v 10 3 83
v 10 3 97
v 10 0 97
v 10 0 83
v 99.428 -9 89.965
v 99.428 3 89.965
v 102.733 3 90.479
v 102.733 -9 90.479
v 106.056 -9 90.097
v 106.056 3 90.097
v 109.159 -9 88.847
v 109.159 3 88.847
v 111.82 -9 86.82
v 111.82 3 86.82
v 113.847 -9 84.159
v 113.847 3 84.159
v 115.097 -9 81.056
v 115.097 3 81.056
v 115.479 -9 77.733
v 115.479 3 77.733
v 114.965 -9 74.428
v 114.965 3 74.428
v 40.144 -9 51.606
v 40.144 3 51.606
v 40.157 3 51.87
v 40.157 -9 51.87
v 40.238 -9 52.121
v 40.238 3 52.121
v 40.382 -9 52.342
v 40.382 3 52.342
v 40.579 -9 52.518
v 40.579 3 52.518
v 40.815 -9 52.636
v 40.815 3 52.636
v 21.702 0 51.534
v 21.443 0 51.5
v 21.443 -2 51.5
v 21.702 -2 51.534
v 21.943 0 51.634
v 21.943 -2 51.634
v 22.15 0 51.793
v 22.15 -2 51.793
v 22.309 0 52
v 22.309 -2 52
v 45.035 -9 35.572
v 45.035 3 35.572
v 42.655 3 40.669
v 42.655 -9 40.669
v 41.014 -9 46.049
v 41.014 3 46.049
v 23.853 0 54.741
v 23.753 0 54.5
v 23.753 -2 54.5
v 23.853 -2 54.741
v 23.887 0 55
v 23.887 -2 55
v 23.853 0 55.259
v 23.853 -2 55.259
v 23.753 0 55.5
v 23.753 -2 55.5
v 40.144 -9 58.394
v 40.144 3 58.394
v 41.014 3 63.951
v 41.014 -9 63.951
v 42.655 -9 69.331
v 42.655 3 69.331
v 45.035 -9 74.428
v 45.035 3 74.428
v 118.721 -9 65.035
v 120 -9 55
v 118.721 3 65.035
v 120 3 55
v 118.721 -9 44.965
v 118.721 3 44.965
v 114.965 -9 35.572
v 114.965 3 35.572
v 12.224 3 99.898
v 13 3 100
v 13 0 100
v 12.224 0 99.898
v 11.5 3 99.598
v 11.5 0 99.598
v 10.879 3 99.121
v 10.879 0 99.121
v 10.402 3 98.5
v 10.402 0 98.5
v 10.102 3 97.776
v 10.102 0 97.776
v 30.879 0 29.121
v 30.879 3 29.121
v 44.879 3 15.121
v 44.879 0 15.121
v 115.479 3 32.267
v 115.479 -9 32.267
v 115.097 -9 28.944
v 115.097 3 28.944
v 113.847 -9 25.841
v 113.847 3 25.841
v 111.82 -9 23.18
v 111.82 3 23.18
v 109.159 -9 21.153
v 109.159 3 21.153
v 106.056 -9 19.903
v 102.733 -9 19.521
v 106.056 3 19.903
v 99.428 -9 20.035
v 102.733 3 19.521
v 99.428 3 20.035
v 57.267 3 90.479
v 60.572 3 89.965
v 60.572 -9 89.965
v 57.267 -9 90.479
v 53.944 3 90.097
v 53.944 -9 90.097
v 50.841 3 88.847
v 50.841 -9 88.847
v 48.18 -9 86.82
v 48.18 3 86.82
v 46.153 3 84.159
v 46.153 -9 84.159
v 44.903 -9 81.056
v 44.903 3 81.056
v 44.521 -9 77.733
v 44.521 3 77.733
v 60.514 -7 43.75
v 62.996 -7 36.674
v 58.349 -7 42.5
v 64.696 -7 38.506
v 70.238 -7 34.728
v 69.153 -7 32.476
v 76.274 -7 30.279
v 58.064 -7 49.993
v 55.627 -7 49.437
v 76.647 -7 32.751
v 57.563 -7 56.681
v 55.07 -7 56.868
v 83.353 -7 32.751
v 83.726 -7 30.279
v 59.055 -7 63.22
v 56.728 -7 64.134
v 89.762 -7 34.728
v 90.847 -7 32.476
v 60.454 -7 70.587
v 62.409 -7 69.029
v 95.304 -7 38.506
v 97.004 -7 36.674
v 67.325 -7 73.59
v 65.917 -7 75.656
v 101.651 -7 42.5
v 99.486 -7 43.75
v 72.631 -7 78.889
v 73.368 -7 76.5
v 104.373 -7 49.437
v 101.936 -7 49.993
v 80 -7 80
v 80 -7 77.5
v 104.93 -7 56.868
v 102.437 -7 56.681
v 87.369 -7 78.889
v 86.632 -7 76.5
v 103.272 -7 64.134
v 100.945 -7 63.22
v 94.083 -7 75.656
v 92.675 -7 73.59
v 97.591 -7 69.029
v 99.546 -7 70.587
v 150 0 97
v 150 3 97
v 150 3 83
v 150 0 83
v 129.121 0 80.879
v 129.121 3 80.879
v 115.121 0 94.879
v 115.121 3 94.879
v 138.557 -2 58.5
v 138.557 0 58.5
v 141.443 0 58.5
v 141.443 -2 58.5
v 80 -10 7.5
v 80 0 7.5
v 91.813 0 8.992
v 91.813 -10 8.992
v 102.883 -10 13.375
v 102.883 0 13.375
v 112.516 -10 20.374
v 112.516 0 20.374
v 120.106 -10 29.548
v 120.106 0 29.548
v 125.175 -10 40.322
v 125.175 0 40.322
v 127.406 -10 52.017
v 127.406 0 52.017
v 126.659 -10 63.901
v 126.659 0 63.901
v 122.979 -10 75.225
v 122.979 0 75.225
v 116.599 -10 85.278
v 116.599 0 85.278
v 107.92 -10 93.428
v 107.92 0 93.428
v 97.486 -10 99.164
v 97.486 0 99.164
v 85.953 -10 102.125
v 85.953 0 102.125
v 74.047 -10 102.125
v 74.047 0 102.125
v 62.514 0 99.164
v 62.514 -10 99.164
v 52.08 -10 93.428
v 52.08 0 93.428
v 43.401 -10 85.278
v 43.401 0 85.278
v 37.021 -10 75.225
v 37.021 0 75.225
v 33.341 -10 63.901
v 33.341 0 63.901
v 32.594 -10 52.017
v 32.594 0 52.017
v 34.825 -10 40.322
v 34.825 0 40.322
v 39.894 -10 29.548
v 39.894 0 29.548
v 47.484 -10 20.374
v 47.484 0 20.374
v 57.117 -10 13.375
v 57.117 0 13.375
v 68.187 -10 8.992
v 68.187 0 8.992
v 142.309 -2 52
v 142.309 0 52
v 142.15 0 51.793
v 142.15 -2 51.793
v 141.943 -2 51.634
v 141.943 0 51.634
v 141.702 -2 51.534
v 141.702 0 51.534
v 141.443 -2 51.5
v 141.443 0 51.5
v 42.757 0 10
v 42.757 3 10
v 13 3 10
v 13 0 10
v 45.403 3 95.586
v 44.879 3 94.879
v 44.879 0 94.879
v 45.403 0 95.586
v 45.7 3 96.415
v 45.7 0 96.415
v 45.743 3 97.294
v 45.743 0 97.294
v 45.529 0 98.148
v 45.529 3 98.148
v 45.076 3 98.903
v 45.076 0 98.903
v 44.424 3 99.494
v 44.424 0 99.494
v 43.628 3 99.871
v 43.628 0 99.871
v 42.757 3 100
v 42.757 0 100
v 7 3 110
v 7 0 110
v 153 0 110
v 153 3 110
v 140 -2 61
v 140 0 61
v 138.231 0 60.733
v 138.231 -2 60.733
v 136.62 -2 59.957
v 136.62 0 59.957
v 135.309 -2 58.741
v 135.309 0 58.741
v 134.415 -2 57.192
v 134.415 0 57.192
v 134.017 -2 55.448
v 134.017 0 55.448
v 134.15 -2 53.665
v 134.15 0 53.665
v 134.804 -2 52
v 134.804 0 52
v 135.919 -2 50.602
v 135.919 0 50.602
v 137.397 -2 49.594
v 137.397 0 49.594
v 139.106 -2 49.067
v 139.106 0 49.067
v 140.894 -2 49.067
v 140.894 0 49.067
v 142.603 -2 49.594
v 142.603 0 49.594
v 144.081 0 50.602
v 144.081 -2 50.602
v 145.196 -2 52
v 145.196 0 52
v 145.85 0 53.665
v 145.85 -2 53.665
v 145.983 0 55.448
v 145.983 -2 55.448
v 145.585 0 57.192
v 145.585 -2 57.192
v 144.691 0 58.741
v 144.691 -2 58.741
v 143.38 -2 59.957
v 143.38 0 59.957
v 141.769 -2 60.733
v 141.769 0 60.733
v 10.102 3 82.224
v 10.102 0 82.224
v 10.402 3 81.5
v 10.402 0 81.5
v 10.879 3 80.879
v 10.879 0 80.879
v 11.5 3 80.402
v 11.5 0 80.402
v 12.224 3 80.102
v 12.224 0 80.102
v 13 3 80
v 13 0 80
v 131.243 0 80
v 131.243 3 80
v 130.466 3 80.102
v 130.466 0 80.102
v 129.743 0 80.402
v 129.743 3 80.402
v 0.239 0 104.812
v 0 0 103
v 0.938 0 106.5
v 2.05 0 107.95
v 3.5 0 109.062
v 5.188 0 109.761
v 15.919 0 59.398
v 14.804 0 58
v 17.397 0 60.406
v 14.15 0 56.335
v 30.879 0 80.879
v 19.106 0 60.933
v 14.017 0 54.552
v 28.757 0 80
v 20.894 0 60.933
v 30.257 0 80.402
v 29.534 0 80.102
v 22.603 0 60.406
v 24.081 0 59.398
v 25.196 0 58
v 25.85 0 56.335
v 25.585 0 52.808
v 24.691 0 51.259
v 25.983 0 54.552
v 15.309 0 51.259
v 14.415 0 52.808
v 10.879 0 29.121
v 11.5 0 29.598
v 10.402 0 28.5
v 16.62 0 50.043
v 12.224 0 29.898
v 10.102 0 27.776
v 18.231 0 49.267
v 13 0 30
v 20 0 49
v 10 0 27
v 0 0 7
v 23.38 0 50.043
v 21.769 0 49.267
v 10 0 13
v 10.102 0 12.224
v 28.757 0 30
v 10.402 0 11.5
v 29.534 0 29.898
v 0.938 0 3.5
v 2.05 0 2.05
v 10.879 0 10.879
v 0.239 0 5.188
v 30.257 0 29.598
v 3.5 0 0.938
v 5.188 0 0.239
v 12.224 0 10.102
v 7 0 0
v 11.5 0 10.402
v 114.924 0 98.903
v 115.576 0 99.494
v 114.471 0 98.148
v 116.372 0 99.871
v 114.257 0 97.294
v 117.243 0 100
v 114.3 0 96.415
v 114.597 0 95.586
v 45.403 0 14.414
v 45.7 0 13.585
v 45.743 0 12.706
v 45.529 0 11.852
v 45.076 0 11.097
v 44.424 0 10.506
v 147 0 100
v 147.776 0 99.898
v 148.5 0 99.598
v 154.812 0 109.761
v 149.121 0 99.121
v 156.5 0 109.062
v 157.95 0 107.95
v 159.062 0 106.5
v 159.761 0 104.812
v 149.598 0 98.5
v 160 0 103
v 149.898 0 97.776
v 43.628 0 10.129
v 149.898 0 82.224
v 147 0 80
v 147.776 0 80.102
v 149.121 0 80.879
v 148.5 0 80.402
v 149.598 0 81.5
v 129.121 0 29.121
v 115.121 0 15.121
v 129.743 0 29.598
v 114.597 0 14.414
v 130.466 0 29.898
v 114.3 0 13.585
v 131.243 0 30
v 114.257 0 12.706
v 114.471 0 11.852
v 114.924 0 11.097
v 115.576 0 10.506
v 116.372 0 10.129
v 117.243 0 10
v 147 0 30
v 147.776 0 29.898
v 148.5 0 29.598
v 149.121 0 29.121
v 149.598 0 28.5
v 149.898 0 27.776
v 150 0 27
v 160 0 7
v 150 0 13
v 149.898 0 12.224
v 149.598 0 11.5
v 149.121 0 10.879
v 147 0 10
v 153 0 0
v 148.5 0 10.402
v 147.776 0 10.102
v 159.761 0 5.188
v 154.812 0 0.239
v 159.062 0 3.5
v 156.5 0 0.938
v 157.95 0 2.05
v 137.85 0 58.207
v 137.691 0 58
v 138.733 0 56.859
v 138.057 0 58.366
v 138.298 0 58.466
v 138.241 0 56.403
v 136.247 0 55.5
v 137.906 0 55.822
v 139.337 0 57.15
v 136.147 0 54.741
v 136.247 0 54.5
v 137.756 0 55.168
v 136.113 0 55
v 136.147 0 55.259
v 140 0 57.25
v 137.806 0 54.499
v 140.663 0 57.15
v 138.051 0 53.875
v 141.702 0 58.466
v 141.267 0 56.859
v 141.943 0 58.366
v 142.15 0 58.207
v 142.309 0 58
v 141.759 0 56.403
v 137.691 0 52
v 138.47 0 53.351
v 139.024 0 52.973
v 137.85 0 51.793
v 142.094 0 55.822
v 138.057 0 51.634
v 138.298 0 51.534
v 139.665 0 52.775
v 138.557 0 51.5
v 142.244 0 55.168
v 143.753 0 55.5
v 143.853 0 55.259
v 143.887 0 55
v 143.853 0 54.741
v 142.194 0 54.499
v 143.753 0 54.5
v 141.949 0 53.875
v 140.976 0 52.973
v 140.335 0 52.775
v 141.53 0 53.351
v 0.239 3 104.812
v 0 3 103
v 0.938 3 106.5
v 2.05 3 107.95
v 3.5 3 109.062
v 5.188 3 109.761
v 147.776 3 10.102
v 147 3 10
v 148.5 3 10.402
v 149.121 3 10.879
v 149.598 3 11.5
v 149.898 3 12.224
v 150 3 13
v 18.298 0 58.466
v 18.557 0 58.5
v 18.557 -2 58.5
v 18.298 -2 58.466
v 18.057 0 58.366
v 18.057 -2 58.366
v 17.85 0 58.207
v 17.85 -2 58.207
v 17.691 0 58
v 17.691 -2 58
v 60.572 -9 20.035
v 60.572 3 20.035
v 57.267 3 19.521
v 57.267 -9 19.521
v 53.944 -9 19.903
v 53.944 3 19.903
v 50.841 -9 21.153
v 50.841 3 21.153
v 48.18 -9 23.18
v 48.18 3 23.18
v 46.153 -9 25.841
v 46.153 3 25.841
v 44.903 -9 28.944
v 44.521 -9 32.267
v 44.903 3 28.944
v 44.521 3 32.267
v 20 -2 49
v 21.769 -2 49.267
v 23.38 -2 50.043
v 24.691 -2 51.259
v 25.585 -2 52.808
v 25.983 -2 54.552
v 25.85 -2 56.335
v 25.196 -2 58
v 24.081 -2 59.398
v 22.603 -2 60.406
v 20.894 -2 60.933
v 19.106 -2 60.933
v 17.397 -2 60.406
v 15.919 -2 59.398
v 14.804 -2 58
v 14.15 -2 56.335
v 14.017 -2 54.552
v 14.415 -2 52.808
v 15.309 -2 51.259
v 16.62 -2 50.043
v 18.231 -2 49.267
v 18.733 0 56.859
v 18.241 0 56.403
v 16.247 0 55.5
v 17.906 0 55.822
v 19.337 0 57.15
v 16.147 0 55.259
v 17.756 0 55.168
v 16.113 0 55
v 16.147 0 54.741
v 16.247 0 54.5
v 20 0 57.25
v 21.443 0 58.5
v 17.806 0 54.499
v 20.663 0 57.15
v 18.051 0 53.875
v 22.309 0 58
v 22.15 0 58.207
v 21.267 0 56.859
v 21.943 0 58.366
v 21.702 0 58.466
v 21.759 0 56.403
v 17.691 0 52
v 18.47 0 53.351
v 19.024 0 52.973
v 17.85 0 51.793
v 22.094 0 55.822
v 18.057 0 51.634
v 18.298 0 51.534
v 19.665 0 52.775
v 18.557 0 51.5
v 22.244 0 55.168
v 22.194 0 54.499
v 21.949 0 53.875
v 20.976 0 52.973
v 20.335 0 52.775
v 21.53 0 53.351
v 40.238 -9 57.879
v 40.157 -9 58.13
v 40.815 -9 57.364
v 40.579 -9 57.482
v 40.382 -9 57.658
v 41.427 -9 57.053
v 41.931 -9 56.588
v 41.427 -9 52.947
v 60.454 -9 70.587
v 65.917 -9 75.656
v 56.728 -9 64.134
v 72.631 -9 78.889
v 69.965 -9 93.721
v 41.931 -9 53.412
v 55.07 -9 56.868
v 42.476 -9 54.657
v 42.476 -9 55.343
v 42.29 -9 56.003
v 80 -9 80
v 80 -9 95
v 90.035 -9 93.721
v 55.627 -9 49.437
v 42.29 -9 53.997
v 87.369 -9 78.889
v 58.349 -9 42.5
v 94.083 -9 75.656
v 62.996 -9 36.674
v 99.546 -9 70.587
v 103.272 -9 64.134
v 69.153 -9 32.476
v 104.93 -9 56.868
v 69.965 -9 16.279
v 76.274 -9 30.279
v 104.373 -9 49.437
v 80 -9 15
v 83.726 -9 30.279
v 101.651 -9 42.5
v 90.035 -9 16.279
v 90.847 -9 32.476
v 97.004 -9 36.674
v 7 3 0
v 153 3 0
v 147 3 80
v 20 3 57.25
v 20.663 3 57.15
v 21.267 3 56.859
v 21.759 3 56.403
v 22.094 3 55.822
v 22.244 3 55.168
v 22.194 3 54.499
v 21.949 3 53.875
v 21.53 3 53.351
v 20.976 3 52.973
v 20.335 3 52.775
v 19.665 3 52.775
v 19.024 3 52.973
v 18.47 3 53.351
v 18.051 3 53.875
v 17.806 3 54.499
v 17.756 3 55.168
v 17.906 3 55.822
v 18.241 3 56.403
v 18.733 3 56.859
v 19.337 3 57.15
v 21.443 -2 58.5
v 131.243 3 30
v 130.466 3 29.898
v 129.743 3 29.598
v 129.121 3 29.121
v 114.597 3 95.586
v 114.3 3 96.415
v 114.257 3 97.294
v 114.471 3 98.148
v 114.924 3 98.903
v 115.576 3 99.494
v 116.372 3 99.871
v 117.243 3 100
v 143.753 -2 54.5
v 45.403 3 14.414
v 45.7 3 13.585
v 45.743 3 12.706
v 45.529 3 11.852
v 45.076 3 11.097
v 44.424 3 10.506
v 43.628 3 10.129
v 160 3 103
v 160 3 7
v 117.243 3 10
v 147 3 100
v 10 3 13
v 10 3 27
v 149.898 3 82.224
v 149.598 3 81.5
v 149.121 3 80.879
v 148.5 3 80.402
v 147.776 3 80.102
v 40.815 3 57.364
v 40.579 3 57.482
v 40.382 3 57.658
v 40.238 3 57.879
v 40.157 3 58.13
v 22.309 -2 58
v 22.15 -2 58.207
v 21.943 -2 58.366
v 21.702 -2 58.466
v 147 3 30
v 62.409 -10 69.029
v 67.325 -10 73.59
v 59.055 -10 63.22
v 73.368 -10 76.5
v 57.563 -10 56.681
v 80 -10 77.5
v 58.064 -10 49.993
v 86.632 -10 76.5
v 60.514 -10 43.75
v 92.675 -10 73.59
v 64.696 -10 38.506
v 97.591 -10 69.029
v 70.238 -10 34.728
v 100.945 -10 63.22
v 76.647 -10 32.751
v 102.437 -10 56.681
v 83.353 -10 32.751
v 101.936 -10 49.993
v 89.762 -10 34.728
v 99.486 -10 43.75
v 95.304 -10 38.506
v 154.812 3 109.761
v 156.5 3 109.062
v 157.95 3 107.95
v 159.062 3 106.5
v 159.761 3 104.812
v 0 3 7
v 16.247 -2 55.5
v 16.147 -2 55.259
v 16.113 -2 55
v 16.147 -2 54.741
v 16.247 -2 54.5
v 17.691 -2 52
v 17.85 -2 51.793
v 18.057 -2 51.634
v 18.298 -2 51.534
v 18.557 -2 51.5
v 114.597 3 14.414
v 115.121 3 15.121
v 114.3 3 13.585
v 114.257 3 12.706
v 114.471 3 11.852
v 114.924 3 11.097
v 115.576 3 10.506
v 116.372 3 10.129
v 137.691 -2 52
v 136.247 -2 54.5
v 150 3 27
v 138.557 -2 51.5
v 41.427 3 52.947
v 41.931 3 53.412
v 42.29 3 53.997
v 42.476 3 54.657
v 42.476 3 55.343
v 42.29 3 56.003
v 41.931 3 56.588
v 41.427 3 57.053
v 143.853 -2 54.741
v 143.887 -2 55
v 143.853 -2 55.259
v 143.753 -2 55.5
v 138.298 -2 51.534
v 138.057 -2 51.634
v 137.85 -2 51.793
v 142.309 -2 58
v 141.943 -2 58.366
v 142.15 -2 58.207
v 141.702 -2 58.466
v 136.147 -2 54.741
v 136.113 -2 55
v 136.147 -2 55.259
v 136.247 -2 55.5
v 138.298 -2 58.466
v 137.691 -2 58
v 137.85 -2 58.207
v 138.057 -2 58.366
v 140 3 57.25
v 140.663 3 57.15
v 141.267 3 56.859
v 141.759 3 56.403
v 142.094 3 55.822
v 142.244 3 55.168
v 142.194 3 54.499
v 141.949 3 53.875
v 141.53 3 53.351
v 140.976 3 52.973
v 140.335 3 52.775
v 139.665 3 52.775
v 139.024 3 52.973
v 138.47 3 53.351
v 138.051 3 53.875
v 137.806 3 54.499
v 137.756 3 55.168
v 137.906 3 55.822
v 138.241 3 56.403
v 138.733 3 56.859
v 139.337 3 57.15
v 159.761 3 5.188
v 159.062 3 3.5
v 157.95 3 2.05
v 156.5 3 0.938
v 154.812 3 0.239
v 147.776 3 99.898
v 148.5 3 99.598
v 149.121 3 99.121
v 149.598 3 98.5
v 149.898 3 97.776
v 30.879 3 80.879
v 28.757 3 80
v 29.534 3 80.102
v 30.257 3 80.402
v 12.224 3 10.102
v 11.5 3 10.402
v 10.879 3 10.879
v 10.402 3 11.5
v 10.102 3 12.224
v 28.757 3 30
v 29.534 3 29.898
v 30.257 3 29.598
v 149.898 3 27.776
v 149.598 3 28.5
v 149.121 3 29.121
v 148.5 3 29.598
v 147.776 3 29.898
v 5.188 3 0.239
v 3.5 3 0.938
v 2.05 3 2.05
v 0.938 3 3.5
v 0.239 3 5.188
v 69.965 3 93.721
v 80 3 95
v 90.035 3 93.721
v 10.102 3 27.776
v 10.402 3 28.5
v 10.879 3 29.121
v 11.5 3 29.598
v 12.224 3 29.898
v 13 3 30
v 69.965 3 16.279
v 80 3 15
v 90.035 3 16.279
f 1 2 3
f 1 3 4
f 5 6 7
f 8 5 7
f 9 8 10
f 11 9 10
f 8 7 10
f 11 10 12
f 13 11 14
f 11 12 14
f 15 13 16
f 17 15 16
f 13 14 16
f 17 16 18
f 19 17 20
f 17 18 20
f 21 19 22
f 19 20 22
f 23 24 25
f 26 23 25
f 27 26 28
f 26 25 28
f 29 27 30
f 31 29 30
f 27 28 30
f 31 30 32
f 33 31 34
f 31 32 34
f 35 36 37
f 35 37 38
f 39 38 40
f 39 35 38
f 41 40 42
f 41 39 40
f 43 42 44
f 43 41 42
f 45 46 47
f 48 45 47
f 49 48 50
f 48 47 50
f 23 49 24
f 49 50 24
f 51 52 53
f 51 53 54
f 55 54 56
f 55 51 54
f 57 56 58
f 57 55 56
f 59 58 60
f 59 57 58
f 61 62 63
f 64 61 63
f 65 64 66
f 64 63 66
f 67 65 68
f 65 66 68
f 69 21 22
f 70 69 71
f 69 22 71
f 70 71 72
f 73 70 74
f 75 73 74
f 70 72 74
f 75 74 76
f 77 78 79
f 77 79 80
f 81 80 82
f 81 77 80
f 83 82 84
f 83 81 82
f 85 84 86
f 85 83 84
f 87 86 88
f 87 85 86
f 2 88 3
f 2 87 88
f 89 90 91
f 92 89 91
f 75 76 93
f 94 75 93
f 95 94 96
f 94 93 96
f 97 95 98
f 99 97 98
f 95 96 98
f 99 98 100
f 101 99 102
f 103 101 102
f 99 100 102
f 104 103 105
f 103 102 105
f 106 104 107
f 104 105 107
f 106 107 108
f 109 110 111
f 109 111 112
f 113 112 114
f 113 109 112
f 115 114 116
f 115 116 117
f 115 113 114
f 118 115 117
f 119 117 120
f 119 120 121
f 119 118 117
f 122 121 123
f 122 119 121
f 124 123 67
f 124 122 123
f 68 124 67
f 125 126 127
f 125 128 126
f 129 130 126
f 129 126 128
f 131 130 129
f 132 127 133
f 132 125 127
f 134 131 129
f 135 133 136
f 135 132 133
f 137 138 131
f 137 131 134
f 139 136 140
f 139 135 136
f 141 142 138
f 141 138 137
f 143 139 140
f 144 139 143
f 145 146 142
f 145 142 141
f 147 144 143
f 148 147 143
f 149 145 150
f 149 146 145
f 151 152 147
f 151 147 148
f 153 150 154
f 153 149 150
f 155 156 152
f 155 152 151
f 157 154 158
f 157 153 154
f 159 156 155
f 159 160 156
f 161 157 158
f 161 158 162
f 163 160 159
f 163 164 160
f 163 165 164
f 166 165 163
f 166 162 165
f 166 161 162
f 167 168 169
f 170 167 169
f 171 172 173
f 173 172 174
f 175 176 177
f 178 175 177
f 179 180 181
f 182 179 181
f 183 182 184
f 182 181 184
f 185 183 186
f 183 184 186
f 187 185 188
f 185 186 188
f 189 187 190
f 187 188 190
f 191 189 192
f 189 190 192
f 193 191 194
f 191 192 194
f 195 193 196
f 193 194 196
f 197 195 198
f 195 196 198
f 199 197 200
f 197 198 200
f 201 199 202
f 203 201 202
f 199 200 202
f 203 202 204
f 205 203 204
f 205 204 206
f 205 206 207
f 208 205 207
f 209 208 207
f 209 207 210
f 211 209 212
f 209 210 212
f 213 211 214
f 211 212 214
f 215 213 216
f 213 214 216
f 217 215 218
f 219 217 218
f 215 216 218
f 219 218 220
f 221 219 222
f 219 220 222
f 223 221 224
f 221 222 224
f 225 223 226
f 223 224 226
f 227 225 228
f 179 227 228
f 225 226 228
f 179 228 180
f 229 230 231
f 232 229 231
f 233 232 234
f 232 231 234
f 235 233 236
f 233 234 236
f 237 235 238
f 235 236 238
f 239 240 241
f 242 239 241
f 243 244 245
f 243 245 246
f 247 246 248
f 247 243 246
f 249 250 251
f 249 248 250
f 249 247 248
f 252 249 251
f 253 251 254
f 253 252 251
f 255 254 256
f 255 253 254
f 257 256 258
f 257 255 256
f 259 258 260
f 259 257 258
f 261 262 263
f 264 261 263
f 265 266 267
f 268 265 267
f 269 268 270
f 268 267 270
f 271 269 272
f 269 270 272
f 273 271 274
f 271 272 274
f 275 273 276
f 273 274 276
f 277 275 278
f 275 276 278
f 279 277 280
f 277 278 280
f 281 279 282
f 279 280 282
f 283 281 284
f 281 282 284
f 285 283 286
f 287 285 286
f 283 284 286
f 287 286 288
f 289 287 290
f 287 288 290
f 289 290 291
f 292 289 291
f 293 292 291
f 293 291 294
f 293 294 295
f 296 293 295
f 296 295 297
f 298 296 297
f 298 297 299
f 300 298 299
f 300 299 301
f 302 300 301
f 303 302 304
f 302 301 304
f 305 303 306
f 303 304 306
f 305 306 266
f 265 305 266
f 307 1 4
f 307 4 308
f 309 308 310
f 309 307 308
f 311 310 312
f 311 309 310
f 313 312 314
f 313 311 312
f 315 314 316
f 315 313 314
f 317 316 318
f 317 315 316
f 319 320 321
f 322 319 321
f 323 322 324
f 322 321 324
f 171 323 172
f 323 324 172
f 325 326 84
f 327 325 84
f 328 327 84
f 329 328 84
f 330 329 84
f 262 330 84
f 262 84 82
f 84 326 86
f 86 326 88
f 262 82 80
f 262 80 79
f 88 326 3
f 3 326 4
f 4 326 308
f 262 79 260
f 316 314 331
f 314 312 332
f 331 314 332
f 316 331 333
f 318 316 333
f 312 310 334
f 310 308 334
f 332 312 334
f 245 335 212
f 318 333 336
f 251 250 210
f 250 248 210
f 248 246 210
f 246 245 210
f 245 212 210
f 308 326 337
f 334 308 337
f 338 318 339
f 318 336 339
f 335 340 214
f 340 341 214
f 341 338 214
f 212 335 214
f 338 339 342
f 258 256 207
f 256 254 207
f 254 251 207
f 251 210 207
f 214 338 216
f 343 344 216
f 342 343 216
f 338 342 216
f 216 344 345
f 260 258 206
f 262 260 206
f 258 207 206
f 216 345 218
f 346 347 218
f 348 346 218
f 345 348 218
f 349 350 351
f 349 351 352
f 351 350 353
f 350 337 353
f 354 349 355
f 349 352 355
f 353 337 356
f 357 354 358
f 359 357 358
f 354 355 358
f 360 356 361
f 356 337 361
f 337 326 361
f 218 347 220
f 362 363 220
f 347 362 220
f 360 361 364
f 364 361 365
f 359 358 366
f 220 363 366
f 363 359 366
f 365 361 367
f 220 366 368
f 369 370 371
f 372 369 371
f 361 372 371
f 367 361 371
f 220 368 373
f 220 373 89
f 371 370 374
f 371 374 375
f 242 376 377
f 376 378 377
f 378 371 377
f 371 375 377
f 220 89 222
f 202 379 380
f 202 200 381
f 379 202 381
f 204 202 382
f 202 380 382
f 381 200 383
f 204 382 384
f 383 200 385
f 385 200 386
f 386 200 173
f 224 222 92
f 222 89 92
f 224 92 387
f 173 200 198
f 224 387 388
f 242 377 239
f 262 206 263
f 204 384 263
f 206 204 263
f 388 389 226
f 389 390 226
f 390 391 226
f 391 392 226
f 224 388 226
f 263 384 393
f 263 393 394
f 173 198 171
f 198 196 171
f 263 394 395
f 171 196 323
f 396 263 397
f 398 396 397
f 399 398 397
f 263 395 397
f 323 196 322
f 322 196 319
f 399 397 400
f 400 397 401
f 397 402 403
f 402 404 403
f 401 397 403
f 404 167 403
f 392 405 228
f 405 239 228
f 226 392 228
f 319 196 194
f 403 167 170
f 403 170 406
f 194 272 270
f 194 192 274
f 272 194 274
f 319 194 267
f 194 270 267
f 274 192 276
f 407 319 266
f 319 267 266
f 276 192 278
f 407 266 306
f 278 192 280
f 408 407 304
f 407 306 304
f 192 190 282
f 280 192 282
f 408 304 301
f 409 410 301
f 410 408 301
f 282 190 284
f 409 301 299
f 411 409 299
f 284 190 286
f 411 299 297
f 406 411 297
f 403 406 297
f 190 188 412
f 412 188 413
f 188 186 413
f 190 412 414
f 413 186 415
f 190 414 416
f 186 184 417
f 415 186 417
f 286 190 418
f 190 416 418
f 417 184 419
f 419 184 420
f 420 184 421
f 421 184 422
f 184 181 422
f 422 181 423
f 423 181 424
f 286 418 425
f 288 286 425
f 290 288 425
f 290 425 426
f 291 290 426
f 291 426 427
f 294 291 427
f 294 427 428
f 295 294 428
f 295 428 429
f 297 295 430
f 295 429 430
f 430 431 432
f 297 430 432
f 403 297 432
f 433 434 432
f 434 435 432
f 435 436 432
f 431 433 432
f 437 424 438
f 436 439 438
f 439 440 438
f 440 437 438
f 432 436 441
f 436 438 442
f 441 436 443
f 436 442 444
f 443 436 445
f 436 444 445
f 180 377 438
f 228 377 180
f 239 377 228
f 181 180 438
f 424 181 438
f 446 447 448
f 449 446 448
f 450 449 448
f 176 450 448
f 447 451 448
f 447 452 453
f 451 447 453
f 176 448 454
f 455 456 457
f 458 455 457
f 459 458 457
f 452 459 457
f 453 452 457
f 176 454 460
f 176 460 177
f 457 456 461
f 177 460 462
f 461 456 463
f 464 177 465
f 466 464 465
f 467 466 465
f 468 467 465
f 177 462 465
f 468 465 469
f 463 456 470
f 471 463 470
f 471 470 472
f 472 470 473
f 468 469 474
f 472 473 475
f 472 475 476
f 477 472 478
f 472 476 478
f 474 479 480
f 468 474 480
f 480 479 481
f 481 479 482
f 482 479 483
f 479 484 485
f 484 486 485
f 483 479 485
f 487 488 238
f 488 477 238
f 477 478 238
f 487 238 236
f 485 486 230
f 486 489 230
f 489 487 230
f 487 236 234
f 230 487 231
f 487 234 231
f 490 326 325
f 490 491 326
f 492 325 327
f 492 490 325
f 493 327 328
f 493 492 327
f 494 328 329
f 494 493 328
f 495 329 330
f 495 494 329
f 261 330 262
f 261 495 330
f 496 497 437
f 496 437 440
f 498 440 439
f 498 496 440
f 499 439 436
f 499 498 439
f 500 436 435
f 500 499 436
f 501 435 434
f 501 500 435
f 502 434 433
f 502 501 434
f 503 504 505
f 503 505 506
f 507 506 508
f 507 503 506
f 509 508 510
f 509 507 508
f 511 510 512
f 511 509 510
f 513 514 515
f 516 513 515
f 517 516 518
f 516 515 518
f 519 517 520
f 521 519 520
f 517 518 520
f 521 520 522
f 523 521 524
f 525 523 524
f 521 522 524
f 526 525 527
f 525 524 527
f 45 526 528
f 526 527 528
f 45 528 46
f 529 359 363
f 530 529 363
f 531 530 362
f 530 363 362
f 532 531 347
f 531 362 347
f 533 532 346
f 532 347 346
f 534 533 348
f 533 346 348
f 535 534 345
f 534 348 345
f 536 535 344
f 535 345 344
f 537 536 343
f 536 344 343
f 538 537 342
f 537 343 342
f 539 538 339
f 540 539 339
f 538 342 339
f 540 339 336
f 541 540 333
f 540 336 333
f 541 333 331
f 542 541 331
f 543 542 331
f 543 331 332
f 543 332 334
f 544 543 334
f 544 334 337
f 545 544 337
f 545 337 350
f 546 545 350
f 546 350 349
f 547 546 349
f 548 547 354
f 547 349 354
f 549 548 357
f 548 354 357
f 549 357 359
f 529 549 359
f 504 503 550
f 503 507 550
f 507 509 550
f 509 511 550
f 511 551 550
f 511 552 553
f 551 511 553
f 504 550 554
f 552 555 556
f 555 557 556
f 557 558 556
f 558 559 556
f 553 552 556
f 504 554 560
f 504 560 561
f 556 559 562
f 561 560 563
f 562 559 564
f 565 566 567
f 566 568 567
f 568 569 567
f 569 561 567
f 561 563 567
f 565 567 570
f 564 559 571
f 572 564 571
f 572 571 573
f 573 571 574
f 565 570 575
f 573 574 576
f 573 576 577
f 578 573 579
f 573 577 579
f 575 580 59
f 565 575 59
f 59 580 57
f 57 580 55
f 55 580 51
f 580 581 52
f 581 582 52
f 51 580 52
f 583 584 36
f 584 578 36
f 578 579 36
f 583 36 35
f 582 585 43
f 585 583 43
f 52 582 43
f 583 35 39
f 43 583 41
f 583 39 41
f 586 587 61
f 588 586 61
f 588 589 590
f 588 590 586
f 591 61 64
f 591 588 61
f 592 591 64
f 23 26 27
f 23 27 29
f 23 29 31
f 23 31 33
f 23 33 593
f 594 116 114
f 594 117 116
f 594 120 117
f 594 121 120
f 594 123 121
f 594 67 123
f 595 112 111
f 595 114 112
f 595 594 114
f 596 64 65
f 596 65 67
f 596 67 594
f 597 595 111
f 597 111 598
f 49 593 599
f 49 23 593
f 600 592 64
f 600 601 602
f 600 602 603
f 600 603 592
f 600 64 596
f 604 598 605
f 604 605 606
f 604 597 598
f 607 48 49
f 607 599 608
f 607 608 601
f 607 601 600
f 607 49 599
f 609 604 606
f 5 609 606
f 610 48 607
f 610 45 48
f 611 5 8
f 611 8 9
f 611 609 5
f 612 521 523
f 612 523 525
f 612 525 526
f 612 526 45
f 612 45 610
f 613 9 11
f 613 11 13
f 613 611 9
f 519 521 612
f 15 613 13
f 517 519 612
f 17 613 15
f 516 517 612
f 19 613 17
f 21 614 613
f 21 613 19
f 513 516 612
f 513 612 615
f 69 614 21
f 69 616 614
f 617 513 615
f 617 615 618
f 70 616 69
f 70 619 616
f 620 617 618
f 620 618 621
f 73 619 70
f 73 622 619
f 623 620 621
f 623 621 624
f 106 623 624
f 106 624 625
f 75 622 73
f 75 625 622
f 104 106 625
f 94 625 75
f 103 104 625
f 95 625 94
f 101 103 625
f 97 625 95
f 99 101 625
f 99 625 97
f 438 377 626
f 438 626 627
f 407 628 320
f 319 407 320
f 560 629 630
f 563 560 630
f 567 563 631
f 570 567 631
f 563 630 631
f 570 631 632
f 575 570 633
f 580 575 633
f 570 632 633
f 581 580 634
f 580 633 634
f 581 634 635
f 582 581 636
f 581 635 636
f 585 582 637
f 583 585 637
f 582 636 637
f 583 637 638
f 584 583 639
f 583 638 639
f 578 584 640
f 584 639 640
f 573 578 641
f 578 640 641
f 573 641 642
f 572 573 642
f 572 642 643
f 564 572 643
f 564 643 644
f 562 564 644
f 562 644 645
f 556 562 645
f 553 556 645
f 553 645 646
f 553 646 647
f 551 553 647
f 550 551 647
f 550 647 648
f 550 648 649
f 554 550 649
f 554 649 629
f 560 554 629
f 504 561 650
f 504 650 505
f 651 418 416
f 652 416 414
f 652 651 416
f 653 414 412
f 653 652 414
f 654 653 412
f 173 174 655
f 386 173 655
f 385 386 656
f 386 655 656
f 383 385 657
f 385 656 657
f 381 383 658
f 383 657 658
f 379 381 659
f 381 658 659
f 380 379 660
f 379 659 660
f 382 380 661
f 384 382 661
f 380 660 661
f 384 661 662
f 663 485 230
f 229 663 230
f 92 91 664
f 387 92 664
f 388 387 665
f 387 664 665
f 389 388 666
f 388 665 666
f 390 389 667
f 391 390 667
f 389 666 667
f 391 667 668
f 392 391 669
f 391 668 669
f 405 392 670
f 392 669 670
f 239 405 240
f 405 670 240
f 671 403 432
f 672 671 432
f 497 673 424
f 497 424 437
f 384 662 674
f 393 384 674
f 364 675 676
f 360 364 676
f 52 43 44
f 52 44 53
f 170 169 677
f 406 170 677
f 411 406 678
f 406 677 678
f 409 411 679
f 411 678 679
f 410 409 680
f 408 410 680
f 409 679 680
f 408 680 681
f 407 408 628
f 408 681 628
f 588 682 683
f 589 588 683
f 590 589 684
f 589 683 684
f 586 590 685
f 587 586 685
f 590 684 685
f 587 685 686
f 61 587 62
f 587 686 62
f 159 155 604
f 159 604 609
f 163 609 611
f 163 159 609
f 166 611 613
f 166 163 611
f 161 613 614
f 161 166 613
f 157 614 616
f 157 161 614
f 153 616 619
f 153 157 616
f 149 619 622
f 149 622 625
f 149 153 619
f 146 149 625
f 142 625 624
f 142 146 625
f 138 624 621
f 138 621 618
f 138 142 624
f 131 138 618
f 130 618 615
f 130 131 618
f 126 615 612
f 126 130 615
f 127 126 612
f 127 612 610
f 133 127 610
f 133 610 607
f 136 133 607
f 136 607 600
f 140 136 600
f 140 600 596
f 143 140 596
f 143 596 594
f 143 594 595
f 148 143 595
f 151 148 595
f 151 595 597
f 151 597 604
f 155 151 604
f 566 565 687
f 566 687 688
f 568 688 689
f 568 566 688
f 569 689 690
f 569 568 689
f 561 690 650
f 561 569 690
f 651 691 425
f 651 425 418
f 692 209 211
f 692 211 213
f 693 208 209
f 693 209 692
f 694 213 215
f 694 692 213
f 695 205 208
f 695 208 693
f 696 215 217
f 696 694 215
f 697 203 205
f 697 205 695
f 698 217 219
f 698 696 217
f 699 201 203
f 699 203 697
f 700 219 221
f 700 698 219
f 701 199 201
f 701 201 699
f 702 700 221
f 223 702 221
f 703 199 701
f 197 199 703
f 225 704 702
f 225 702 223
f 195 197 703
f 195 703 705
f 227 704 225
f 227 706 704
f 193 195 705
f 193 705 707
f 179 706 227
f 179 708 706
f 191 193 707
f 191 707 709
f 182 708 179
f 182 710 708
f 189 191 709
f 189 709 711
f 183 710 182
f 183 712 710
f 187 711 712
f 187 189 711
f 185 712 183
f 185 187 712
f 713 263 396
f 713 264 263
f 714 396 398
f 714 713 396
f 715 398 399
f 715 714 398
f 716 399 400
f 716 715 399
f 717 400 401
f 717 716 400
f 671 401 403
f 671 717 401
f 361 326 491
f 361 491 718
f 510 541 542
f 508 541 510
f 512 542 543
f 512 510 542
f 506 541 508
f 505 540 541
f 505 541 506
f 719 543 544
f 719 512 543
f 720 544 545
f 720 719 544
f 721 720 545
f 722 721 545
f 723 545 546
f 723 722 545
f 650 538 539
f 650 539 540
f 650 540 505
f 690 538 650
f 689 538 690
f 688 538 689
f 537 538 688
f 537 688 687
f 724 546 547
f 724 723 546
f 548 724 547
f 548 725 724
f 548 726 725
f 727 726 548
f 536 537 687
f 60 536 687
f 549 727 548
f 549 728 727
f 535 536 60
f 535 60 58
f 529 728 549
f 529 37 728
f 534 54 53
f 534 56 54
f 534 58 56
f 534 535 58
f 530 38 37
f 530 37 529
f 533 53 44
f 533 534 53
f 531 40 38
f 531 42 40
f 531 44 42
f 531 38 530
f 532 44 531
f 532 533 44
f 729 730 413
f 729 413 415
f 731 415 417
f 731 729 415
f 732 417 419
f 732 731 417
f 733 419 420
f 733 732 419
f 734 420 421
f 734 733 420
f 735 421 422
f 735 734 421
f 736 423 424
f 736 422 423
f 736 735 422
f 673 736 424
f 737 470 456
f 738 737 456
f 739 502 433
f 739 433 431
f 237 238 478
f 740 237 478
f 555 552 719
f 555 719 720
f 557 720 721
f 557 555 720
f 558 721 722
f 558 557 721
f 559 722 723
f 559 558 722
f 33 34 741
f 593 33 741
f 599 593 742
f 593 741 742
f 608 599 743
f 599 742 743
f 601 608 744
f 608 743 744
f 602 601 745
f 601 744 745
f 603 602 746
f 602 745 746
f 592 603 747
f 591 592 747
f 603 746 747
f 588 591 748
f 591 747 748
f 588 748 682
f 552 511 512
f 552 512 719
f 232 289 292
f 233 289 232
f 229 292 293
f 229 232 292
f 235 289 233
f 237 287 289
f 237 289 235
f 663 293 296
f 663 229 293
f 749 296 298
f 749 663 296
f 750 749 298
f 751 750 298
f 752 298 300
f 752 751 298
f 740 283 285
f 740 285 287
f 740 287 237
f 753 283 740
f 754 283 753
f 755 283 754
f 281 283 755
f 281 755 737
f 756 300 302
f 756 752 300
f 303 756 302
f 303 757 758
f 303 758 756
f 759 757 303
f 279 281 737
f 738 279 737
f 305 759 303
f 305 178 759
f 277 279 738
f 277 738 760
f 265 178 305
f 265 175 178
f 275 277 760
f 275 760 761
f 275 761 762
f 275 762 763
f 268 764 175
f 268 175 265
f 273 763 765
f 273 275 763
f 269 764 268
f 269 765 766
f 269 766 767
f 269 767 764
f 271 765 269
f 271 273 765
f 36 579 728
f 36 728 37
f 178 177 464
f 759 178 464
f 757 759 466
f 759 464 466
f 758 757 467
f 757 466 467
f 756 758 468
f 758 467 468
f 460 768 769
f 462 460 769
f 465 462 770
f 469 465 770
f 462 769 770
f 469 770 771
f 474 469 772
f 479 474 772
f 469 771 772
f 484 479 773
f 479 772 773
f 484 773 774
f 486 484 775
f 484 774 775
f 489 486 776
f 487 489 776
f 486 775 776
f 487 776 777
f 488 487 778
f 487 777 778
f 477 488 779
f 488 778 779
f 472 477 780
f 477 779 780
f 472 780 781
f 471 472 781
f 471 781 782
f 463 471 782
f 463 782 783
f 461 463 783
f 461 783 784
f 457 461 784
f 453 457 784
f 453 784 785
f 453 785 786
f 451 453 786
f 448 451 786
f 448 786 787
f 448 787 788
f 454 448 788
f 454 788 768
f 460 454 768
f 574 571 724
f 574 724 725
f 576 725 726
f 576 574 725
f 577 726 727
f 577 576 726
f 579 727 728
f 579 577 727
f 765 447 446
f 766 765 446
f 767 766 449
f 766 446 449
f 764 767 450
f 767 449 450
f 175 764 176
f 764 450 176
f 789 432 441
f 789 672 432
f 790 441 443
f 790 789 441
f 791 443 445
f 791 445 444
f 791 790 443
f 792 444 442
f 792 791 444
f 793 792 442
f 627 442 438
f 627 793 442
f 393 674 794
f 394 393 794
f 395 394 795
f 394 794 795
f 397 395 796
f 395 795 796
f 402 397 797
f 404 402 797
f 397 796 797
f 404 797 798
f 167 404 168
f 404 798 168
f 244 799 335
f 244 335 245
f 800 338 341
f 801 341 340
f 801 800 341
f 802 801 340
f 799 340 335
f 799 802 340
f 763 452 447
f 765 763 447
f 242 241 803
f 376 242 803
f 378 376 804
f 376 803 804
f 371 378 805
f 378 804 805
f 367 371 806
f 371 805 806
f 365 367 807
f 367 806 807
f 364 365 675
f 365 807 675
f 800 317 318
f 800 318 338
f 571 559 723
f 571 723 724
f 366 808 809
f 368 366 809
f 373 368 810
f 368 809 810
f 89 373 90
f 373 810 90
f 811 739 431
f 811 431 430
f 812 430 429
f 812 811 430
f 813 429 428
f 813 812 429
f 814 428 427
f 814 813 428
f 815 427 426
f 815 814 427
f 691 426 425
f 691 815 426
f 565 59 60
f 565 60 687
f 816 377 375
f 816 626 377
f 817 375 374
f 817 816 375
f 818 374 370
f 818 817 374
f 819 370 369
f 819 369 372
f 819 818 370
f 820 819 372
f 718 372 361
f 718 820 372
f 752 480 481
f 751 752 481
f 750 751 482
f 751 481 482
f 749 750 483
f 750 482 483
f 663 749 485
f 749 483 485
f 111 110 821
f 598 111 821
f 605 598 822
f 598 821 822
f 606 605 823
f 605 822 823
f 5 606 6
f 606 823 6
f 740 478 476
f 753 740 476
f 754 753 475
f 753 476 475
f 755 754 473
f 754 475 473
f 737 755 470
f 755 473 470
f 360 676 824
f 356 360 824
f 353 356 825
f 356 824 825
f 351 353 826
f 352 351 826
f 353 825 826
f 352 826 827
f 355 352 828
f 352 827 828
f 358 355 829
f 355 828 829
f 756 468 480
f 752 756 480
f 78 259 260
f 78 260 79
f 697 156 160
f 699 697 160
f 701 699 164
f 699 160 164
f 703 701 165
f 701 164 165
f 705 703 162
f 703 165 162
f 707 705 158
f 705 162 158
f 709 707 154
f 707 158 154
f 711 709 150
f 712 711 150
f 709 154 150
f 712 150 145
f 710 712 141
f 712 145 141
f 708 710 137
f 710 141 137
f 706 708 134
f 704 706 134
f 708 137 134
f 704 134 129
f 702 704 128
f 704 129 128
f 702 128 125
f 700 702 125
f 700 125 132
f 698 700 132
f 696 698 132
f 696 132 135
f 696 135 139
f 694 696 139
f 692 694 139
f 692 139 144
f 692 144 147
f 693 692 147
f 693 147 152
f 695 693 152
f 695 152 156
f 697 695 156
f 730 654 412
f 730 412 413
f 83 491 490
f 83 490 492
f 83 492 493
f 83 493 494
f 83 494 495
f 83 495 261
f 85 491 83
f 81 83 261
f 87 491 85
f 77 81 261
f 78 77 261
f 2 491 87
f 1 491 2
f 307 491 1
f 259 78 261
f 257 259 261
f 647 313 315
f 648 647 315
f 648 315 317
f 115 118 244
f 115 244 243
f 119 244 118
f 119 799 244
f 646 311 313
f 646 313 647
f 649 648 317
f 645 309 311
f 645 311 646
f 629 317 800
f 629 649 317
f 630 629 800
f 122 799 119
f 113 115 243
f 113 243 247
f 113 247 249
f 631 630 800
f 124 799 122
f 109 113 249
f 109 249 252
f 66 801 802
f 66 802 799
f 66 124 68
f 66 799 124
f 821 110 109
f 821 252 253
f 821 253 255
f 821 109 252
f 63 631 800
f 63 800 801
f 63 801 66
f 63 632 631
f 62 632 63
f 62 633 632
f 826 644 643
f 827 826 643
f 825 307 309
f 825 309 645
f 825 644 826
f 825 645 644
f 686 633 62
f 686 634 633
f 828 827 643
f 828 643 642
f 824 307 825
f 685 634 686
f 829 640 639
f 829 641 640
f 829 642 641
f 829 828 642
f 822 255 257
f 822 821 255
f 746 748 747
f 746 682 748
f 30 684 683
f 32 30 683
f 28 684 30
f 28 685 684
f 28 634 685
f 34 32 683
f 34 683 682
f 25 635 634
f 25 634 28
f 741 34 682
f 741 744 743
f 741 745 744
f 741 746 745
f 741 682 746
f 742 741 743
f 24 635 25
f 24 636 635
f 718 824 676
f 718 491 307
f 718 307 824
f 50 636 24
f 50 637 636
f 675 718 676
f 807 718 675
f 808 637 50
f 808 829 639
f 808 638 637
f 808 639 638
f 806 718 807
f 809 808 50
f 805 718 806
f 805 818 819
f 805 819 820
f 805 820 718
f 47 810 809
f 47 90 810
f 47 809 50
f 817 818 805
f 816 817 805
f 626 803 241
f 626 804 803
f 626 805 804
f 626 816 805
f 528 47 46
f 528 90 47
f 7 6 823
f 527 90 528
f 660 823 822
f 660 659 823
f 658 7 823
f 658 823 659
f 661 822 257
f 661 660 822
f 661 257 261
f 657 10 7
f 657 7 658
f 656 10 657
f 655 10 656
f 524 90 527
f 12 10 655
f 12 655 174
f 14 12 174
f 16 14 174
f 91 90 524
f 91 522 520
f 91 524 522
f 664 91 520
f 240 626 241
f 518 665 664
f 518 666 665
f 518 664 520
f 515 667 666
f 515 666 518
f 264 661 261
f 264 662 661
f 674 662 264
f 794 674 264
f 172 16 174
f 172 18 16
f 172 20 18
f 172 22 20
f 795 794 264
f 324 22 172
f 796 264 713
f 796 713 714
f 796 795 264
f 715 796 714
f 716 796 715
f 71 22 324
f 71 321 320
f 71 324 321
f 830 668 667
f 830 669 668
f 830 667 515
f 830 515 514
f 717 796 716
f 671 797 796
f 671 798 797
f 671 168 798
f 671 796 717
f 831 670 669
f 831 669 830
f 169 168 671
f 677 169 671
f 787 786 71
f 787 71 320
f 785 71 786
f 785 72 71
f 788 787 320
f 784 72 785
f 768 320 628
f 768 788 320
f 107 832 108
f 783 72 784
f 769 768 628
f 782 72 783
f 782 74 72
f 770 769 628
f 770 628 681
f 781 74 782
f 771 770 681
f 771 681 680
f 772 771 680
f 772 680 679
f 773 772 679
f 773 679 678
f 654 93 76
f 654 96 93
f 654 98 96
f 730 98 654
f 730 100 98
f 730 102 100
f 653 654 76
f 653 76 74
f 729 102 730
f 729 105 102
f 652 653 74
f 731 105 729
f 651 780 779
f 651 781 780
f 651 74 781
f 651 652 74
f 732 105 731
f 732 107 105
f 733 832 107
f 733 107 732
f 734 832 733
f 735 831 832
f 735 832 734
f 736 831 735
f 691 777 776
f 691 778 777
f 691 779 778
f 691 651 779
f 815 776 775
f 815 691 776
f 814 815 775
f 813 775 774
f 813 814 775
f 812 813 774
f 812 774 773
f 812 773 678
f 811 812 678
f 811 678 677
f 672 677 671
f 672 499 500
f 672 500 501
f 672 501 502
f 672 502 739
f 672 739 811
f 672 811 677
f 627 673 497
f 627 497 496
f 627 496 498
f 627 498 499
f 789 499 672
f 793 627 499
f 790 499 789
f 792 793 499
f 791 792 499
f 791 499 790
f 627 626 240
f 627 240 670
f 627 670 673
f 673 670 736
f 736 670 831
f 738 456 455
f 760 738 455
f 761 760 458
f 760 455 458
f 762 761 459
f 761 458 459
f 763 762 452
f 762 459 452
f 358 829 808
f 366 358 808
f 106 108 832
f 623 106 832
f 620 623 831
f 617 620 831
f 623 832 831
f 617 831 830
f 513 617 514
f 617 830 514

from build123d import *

# Parameters (mm, degrees)
SKETCH1_W           = 160
SKETCH1_H           = 110
BOSS_EXTRUDE1_DEPTH = 3
SKETCH2_R           = 47.5
BOSS_EXTRUDE3_DEPTH = 10
FILLET1_R           = 7
FILLET2_R           = 7
FILLET3_R           = 7
FILLET4_R           = 7
CUT_EXTRUDE3_DEPTH  = 12
SKETCH8_R           = 25
CUT_EXTRUDE4_DEPTH  = 12
SKETCH9_R           = 22.5
CUT_EXTRUDE5_DEPTH  = 15
SKETCH11_R          = 2.25
CUT_EXTRUDE7_DEPTH  = 9
SKETCH12_R          = 6
BOSS_EXTRUDE4_DEPTH = 2
CUT_EXTRUDE8_DEPTH  = 10
SKETCH10_R          = 25
CUT_EXTRUDE9_DEPTH  = 10


with BuildPart() as part:
    # Sketch1 → Boss-Extrude1 (new body)
    with BuildSketch(Plane(origin=(0, 0, 0), x_dir=(1, 0, 0), z_dir=(0, 1, 0))):
        with Locations((80, -55)):
            Rectangle(SKETCH1_W, SKETCH1_H)
    extrude(amount=BOSS_EXTRUDE1_DEPTH)

    # Sketch2 → Boss-Extrude3 (add)
    with BuildSketch(Plane.XZ):
        with Locations(Location((80, 55, 0), (0, 0, 270))):
            Circle(SKETCH2_R)
    extrude(amount=BOSS_EXTRUDE3_DEPTH)

    # Fillet1
    fillet1_edges = [part.edges().sort_by_distance(p)[0] for p in [
        (160, 1.5, 110),
    ]]
    fillet(fillet1_edges, radius=FILLET1_R)

    # Fillet2
    fillet2_edges = [part.edges().sort_by_distance(p)[0] for p in [
        (160, 1.5, 0),
    ]]
    fillet(fillet2_edges, radius=FILLET2_R)

    # Fillet3
    fillet3_edges = [part.edges().sort_by_distance(p)[0] for p in [
        (0, 1.5, 0),
    ]]
    fillet(fillet3_edges, radius=FILLET3_R)

    # Fillet4
    fillet4_edges = [part.edges().sort_by_distance(p)[0] for p in [
        (0, 1.5, 110),
    ]]
    fillet(fillet4_edges, radius=FILLET4_R)

    # Sketch3 → Cut-Extrude3 (cut)
    with BuildSketch(Plane(origin=(0, 3, 0), x_dir=(1, 0, 0), z_dir=(0, 1, 0))):
        with BuildLine():
            ThreePointArc((45.034735386, -74.427564708), (51.715728753, -83.284271247), (60.572435292, -89.965264614))
            ThreePointArc((60.572435292, -89.965264614), (48.180194847, -86.819805153), (45.034735386, -74.427564708))
        make_face()
        with BuildLine():
            ThreePointArc((60.572435292, -20.034735386), (48.180194847, -23.180194847), (45.034735386, -35.572435292))
            ThreePointArc((45.034735386, -35.572435292), (51.715728753, -26.715728753), (60.572435292, -20.034735386))
        make_face()
        with BuildLine():
            ThreePointArc((114.965264614, -35.572435292), (111.819805153, -23.180194847), (99.427564708, -20.034735386))
            ThreePointArc((99.427564708, -20.034735386), (108.284271247, -26.715728753), (114.965264614, -35.572435292))
        make_face()
        with BuildLine():
            ThreePointArc((99.427564708, -89.965264614), (111.819805153, -86.819805153), (114.965264614, -74.427564708))
            ThreePointArc((114.965264614, -74.427564708), (108.284271247, -83.284271247), (99.427564708, -89.965264614))
        make_face()
    extrude(amount=-CUT_EXTRUDE3_DEPTH, mode=Mode.SUBTRACT)

    # Sketch8 → Cut-Extrude4 (cut)
    with BuildSketch(Plane(origin=(0, 3, 0), x_dir=(1, 0, 0), z_dir=(0, 1, 0))):
        with BuildLine():
            ThreePointArc((40.144230769, -58.393767674), (120, -55), (40.144230769, -51.606232326))
            ThreePointArc((40.144230769, -51.606232326), (40.30249314, -52.236544193), (40.814732143, -52.636483227))
            ThreePointArc((40.814732143, -52.636483227), (42.5, -55), (40.814732143, -57.363516773))
            ThreePointArc((40.814732143, -57.363516773), (40.30249314, -57.763455807), (40.144230769, -58.393767674))
        make_face()
        with Locations(Location((80, -55, 0), (0, 0, 270))):
            Circle(SKETCH8_R, mode=Mode.SUBTRACT)
    extrude(amount=-CUT_EXTRUDE4_DEPTH, mode=Mode.SUBTRACT)

    # Sketch9 → Cut-Extrude5 (cut)
    with BuildSketch(Plane(origin=(0, 3, 0), x_dir=(1, 0, 0), z_dir=(0, 1, 0))):
        with Locations(Location((80, -55, 0), (0, 0, 270))):
            Circle(SKETCH9_R)
    extrude(amount=-CUT_EXTRUDE5_DEPTH, mode=Mode.SUBTRACT)

    # Sketch11 → Cut-Extrude7 (cut)
    with BuildSketch(Plane(origin=(0, 3, 0), x_dir=(1, 0, 0), z_dir=(0, 1, 0))):
        with Locations(Location((20, -55, 0), (0, 0, 270))):
            Circle(SKETCH11_R)
        with Locations(Location((140, -55, 0), (0, 0, 270))):
            Circle(SKETCH11_R)
    extrude(amount=-CUT_EXTRUDE7_DEPTH, mode=Mode.SUBTRACT)

    # Sketch12 → Boss-Extrude4 (add)
    # profile 1 of 2: a face of its own
    with BuildSketch(Plane.XZ):
        with Locations(Location((20, 55, 0), (0, 0, 270))):
            Circle(SKETCH12_R)
        with BuildLine():
            Line((23.75277675, 55.5), (22.309401077, 58))
            ThreePointArc((22.309401077, 58), (21.943375673, 58.366025404), (21.443375673, 58.5))
            Line((21.443375673, 58.5), (18.556624327, 58.5))
            ThreePointArc((18.556624327, 58.5), (18.056624327, 58.366025404), (17.690598923, 58))
            Line((17.690598923, 58), (16.24722325, 55.5))
            ThreePointArc((16.24722325, 55.5), (16.113248654, 55), (16.24722325, 54.5))
            Line((16.24722325, 54.5), (17.690598923, 52))
            ThreePointArc((17.690598923, 52), (18.056624327, 51.633974596), (18.556624327, 51.5))
            Line((18.556624327, 51.5), (21.443375673, 51.5))
            ThreePointArc((21.443375673, 51.5), (21.943375673, 51.633974596), (22.309401077, 52))
            Line((22.309401077, 52), (23.75277675, 54.5))
            ThreePointArc((23.75277675, 54.5), (23.886751346, 55), (23.75277675, 55.5))
        make_face(mode=Mode.SUBTRACT)
    # profile 2 of 2: a face of its own
    with BuildSketch(Plane.XZ):
        with Locations(Location((140, 55, 0), (0, 0, 90))):
            Circle(SKETCH12_R)
        with BuildLine():
            Line((137.690598923, 52), (136.24722325, 54.5))
            ThreePointArc((136.24722325, 54.5), (136.113248654, 55), (136.24722325, 55.5))
            Line((136.24722325, 55.5), (137.690598923, 58))
            ThreePointArc((137.690598923, 58), (138.056624327, 58.366025404), (138.556624327, 58.5))
            Line((138.556624327, 58.5), (141.443375673, 58.5))
            ThreePointArc((141.443375673, 58.5), (141.943375673, 58.366025404), (142.309401077, 58))
            Line((142.309401077, 58), (143.75277675, 55.5))
            ThreePointArc((143.75277675, 55.5), (143.886751346, 55), (143.75277675, 54.5))
            Line((143.75277675, 54.5), (142.309401077, 52))
            ThreePointArc((142.309401077, 52), (141.943375673, 51.633974596), (141.443375673, 51.5))
            Line((141.443375673, 51.5), (138.556624327, 51.5))
            ThreePointArc((138.556624327, 51.5), (138.056624327, 51.633974596), (137.690598923, 52))
        make_face(mode=Mode.SUBTRACT)
    extrude(amount=BOSS_EXTRUDE4_DEPTH)

    # Sketch13 → Cut-Extrude8 (cut)
    with BuildSketch(Plane(origin=(0, 3, 0), x_dir=(1, 0, 0), z_dir=(0, 1, 0))):
        with BuildLine():
            Line((10, -13), (10, -27))
            ThreePointArc((10, -27), (10.878679656, -29.121320344), (13, -30))
            Line((13, -30), (28.757359313, -30))
            ThreePointArc((28.757359313, -30), (29.90540961, -29.771638598), (30.878679656, -29.121320344))
            Line((30.878679656, -29.121320344), (44.878679656, -15.121320344))
            ThreePointArc((44.878679656, -15.121320344), (45.52899791, -11.851949703), (42.757359313, -10))
            Line((42.757359313, -10), (13, -10))
            ThreePointArc((13, -10), (10.878679656, -10.878679656), (10, -13))
        make_face()
        with BuildLine():
            Line((129.121320344, -29.121320344), (115.121320344, -15.121320344))
            ThreePointArc((115.121320344, -15.121320344), (114.47100209, -11.851949703), (117.242640687, -10))
            Line((117.242640687, -10), (147, -10))
            ThreePointArc((147, -10), (149.121320344, -10.878679656), (150, -13))
            Line((150, -13), (150, -27))
            ThreePointArc((150, -27), (149.121320344, -29.121320344), (147, -30))
            Line((147, -30), (131.242640687, -30))
            ThreePointArc((131.242640687, -30), (130.09459039, -29.771638598), (129.121320344, -29.121320344))
        make_face()
        with BuildLine():
            Line((150, -97), (150, -83))
            ThreePointArc((150, -83), (149.121320344, -80.878679656), (147, -80))
            Line((147, -80), (131.242640687, -80))
            ThreePointArc((131.242640687, -80), (130.09459039, -80.228361402), (129.121320344, -80.878679656))
            Line((129.121320344, -80.878679656), (115.121320344, -94.878679656))
            ThreePointArc((115.121320344, -94.878679656), (114.47100209, -98.148050297), (117.242640687, -100))
            Line((117.242640687, -100), (147, -100))
            ThreePointArc((147, -100), (149.121320344, -99.121320344), (150, -97))
        make_face()
        with BuildLine():
            Line((30.878679656, -80.878679656), (44.878679656, -94.878679656))
            ThreePointArc((44.878679656, -94.878679656), (45.52899791, -98.148050297), (42.757359313, -100))
            Line((42.757359313, -100), (13, -100))
            ThreePointArc((13, -100), (10.878679656, -99.121320344), (10, -97))
            Line((10, -97), (10, -83))
            ThreePointArc((10, -83), (10.878679656, -80.878679656), (13, -80))
            Line((13, -80), (28.757359313, -80))
            ThreePointArc((28.757359313, -80), (29.90540961, -80.228361402), (30.878679656, -80.878679656))
        make_face()
    extrude(amount=-CUT_EXTRUDE8_DEPTH, mode=Mode.SUBTRACT)

    # Sketch10 → Cut-Extrude9 (cut)
    with BuildSketch(Plane(origin=(0, 3, 0), x_dir=(1, 0, 0), z_dir=(0, 1, 0))):
        with Locations(Location((80, -55, 0), (0, 0, 270))):
            Circle(SKETCH10_R)
    extrude(amount=-CUT_EXTRUDE9_DEPTH, mode=Mode.SUBTRACT)


solid = part.part
